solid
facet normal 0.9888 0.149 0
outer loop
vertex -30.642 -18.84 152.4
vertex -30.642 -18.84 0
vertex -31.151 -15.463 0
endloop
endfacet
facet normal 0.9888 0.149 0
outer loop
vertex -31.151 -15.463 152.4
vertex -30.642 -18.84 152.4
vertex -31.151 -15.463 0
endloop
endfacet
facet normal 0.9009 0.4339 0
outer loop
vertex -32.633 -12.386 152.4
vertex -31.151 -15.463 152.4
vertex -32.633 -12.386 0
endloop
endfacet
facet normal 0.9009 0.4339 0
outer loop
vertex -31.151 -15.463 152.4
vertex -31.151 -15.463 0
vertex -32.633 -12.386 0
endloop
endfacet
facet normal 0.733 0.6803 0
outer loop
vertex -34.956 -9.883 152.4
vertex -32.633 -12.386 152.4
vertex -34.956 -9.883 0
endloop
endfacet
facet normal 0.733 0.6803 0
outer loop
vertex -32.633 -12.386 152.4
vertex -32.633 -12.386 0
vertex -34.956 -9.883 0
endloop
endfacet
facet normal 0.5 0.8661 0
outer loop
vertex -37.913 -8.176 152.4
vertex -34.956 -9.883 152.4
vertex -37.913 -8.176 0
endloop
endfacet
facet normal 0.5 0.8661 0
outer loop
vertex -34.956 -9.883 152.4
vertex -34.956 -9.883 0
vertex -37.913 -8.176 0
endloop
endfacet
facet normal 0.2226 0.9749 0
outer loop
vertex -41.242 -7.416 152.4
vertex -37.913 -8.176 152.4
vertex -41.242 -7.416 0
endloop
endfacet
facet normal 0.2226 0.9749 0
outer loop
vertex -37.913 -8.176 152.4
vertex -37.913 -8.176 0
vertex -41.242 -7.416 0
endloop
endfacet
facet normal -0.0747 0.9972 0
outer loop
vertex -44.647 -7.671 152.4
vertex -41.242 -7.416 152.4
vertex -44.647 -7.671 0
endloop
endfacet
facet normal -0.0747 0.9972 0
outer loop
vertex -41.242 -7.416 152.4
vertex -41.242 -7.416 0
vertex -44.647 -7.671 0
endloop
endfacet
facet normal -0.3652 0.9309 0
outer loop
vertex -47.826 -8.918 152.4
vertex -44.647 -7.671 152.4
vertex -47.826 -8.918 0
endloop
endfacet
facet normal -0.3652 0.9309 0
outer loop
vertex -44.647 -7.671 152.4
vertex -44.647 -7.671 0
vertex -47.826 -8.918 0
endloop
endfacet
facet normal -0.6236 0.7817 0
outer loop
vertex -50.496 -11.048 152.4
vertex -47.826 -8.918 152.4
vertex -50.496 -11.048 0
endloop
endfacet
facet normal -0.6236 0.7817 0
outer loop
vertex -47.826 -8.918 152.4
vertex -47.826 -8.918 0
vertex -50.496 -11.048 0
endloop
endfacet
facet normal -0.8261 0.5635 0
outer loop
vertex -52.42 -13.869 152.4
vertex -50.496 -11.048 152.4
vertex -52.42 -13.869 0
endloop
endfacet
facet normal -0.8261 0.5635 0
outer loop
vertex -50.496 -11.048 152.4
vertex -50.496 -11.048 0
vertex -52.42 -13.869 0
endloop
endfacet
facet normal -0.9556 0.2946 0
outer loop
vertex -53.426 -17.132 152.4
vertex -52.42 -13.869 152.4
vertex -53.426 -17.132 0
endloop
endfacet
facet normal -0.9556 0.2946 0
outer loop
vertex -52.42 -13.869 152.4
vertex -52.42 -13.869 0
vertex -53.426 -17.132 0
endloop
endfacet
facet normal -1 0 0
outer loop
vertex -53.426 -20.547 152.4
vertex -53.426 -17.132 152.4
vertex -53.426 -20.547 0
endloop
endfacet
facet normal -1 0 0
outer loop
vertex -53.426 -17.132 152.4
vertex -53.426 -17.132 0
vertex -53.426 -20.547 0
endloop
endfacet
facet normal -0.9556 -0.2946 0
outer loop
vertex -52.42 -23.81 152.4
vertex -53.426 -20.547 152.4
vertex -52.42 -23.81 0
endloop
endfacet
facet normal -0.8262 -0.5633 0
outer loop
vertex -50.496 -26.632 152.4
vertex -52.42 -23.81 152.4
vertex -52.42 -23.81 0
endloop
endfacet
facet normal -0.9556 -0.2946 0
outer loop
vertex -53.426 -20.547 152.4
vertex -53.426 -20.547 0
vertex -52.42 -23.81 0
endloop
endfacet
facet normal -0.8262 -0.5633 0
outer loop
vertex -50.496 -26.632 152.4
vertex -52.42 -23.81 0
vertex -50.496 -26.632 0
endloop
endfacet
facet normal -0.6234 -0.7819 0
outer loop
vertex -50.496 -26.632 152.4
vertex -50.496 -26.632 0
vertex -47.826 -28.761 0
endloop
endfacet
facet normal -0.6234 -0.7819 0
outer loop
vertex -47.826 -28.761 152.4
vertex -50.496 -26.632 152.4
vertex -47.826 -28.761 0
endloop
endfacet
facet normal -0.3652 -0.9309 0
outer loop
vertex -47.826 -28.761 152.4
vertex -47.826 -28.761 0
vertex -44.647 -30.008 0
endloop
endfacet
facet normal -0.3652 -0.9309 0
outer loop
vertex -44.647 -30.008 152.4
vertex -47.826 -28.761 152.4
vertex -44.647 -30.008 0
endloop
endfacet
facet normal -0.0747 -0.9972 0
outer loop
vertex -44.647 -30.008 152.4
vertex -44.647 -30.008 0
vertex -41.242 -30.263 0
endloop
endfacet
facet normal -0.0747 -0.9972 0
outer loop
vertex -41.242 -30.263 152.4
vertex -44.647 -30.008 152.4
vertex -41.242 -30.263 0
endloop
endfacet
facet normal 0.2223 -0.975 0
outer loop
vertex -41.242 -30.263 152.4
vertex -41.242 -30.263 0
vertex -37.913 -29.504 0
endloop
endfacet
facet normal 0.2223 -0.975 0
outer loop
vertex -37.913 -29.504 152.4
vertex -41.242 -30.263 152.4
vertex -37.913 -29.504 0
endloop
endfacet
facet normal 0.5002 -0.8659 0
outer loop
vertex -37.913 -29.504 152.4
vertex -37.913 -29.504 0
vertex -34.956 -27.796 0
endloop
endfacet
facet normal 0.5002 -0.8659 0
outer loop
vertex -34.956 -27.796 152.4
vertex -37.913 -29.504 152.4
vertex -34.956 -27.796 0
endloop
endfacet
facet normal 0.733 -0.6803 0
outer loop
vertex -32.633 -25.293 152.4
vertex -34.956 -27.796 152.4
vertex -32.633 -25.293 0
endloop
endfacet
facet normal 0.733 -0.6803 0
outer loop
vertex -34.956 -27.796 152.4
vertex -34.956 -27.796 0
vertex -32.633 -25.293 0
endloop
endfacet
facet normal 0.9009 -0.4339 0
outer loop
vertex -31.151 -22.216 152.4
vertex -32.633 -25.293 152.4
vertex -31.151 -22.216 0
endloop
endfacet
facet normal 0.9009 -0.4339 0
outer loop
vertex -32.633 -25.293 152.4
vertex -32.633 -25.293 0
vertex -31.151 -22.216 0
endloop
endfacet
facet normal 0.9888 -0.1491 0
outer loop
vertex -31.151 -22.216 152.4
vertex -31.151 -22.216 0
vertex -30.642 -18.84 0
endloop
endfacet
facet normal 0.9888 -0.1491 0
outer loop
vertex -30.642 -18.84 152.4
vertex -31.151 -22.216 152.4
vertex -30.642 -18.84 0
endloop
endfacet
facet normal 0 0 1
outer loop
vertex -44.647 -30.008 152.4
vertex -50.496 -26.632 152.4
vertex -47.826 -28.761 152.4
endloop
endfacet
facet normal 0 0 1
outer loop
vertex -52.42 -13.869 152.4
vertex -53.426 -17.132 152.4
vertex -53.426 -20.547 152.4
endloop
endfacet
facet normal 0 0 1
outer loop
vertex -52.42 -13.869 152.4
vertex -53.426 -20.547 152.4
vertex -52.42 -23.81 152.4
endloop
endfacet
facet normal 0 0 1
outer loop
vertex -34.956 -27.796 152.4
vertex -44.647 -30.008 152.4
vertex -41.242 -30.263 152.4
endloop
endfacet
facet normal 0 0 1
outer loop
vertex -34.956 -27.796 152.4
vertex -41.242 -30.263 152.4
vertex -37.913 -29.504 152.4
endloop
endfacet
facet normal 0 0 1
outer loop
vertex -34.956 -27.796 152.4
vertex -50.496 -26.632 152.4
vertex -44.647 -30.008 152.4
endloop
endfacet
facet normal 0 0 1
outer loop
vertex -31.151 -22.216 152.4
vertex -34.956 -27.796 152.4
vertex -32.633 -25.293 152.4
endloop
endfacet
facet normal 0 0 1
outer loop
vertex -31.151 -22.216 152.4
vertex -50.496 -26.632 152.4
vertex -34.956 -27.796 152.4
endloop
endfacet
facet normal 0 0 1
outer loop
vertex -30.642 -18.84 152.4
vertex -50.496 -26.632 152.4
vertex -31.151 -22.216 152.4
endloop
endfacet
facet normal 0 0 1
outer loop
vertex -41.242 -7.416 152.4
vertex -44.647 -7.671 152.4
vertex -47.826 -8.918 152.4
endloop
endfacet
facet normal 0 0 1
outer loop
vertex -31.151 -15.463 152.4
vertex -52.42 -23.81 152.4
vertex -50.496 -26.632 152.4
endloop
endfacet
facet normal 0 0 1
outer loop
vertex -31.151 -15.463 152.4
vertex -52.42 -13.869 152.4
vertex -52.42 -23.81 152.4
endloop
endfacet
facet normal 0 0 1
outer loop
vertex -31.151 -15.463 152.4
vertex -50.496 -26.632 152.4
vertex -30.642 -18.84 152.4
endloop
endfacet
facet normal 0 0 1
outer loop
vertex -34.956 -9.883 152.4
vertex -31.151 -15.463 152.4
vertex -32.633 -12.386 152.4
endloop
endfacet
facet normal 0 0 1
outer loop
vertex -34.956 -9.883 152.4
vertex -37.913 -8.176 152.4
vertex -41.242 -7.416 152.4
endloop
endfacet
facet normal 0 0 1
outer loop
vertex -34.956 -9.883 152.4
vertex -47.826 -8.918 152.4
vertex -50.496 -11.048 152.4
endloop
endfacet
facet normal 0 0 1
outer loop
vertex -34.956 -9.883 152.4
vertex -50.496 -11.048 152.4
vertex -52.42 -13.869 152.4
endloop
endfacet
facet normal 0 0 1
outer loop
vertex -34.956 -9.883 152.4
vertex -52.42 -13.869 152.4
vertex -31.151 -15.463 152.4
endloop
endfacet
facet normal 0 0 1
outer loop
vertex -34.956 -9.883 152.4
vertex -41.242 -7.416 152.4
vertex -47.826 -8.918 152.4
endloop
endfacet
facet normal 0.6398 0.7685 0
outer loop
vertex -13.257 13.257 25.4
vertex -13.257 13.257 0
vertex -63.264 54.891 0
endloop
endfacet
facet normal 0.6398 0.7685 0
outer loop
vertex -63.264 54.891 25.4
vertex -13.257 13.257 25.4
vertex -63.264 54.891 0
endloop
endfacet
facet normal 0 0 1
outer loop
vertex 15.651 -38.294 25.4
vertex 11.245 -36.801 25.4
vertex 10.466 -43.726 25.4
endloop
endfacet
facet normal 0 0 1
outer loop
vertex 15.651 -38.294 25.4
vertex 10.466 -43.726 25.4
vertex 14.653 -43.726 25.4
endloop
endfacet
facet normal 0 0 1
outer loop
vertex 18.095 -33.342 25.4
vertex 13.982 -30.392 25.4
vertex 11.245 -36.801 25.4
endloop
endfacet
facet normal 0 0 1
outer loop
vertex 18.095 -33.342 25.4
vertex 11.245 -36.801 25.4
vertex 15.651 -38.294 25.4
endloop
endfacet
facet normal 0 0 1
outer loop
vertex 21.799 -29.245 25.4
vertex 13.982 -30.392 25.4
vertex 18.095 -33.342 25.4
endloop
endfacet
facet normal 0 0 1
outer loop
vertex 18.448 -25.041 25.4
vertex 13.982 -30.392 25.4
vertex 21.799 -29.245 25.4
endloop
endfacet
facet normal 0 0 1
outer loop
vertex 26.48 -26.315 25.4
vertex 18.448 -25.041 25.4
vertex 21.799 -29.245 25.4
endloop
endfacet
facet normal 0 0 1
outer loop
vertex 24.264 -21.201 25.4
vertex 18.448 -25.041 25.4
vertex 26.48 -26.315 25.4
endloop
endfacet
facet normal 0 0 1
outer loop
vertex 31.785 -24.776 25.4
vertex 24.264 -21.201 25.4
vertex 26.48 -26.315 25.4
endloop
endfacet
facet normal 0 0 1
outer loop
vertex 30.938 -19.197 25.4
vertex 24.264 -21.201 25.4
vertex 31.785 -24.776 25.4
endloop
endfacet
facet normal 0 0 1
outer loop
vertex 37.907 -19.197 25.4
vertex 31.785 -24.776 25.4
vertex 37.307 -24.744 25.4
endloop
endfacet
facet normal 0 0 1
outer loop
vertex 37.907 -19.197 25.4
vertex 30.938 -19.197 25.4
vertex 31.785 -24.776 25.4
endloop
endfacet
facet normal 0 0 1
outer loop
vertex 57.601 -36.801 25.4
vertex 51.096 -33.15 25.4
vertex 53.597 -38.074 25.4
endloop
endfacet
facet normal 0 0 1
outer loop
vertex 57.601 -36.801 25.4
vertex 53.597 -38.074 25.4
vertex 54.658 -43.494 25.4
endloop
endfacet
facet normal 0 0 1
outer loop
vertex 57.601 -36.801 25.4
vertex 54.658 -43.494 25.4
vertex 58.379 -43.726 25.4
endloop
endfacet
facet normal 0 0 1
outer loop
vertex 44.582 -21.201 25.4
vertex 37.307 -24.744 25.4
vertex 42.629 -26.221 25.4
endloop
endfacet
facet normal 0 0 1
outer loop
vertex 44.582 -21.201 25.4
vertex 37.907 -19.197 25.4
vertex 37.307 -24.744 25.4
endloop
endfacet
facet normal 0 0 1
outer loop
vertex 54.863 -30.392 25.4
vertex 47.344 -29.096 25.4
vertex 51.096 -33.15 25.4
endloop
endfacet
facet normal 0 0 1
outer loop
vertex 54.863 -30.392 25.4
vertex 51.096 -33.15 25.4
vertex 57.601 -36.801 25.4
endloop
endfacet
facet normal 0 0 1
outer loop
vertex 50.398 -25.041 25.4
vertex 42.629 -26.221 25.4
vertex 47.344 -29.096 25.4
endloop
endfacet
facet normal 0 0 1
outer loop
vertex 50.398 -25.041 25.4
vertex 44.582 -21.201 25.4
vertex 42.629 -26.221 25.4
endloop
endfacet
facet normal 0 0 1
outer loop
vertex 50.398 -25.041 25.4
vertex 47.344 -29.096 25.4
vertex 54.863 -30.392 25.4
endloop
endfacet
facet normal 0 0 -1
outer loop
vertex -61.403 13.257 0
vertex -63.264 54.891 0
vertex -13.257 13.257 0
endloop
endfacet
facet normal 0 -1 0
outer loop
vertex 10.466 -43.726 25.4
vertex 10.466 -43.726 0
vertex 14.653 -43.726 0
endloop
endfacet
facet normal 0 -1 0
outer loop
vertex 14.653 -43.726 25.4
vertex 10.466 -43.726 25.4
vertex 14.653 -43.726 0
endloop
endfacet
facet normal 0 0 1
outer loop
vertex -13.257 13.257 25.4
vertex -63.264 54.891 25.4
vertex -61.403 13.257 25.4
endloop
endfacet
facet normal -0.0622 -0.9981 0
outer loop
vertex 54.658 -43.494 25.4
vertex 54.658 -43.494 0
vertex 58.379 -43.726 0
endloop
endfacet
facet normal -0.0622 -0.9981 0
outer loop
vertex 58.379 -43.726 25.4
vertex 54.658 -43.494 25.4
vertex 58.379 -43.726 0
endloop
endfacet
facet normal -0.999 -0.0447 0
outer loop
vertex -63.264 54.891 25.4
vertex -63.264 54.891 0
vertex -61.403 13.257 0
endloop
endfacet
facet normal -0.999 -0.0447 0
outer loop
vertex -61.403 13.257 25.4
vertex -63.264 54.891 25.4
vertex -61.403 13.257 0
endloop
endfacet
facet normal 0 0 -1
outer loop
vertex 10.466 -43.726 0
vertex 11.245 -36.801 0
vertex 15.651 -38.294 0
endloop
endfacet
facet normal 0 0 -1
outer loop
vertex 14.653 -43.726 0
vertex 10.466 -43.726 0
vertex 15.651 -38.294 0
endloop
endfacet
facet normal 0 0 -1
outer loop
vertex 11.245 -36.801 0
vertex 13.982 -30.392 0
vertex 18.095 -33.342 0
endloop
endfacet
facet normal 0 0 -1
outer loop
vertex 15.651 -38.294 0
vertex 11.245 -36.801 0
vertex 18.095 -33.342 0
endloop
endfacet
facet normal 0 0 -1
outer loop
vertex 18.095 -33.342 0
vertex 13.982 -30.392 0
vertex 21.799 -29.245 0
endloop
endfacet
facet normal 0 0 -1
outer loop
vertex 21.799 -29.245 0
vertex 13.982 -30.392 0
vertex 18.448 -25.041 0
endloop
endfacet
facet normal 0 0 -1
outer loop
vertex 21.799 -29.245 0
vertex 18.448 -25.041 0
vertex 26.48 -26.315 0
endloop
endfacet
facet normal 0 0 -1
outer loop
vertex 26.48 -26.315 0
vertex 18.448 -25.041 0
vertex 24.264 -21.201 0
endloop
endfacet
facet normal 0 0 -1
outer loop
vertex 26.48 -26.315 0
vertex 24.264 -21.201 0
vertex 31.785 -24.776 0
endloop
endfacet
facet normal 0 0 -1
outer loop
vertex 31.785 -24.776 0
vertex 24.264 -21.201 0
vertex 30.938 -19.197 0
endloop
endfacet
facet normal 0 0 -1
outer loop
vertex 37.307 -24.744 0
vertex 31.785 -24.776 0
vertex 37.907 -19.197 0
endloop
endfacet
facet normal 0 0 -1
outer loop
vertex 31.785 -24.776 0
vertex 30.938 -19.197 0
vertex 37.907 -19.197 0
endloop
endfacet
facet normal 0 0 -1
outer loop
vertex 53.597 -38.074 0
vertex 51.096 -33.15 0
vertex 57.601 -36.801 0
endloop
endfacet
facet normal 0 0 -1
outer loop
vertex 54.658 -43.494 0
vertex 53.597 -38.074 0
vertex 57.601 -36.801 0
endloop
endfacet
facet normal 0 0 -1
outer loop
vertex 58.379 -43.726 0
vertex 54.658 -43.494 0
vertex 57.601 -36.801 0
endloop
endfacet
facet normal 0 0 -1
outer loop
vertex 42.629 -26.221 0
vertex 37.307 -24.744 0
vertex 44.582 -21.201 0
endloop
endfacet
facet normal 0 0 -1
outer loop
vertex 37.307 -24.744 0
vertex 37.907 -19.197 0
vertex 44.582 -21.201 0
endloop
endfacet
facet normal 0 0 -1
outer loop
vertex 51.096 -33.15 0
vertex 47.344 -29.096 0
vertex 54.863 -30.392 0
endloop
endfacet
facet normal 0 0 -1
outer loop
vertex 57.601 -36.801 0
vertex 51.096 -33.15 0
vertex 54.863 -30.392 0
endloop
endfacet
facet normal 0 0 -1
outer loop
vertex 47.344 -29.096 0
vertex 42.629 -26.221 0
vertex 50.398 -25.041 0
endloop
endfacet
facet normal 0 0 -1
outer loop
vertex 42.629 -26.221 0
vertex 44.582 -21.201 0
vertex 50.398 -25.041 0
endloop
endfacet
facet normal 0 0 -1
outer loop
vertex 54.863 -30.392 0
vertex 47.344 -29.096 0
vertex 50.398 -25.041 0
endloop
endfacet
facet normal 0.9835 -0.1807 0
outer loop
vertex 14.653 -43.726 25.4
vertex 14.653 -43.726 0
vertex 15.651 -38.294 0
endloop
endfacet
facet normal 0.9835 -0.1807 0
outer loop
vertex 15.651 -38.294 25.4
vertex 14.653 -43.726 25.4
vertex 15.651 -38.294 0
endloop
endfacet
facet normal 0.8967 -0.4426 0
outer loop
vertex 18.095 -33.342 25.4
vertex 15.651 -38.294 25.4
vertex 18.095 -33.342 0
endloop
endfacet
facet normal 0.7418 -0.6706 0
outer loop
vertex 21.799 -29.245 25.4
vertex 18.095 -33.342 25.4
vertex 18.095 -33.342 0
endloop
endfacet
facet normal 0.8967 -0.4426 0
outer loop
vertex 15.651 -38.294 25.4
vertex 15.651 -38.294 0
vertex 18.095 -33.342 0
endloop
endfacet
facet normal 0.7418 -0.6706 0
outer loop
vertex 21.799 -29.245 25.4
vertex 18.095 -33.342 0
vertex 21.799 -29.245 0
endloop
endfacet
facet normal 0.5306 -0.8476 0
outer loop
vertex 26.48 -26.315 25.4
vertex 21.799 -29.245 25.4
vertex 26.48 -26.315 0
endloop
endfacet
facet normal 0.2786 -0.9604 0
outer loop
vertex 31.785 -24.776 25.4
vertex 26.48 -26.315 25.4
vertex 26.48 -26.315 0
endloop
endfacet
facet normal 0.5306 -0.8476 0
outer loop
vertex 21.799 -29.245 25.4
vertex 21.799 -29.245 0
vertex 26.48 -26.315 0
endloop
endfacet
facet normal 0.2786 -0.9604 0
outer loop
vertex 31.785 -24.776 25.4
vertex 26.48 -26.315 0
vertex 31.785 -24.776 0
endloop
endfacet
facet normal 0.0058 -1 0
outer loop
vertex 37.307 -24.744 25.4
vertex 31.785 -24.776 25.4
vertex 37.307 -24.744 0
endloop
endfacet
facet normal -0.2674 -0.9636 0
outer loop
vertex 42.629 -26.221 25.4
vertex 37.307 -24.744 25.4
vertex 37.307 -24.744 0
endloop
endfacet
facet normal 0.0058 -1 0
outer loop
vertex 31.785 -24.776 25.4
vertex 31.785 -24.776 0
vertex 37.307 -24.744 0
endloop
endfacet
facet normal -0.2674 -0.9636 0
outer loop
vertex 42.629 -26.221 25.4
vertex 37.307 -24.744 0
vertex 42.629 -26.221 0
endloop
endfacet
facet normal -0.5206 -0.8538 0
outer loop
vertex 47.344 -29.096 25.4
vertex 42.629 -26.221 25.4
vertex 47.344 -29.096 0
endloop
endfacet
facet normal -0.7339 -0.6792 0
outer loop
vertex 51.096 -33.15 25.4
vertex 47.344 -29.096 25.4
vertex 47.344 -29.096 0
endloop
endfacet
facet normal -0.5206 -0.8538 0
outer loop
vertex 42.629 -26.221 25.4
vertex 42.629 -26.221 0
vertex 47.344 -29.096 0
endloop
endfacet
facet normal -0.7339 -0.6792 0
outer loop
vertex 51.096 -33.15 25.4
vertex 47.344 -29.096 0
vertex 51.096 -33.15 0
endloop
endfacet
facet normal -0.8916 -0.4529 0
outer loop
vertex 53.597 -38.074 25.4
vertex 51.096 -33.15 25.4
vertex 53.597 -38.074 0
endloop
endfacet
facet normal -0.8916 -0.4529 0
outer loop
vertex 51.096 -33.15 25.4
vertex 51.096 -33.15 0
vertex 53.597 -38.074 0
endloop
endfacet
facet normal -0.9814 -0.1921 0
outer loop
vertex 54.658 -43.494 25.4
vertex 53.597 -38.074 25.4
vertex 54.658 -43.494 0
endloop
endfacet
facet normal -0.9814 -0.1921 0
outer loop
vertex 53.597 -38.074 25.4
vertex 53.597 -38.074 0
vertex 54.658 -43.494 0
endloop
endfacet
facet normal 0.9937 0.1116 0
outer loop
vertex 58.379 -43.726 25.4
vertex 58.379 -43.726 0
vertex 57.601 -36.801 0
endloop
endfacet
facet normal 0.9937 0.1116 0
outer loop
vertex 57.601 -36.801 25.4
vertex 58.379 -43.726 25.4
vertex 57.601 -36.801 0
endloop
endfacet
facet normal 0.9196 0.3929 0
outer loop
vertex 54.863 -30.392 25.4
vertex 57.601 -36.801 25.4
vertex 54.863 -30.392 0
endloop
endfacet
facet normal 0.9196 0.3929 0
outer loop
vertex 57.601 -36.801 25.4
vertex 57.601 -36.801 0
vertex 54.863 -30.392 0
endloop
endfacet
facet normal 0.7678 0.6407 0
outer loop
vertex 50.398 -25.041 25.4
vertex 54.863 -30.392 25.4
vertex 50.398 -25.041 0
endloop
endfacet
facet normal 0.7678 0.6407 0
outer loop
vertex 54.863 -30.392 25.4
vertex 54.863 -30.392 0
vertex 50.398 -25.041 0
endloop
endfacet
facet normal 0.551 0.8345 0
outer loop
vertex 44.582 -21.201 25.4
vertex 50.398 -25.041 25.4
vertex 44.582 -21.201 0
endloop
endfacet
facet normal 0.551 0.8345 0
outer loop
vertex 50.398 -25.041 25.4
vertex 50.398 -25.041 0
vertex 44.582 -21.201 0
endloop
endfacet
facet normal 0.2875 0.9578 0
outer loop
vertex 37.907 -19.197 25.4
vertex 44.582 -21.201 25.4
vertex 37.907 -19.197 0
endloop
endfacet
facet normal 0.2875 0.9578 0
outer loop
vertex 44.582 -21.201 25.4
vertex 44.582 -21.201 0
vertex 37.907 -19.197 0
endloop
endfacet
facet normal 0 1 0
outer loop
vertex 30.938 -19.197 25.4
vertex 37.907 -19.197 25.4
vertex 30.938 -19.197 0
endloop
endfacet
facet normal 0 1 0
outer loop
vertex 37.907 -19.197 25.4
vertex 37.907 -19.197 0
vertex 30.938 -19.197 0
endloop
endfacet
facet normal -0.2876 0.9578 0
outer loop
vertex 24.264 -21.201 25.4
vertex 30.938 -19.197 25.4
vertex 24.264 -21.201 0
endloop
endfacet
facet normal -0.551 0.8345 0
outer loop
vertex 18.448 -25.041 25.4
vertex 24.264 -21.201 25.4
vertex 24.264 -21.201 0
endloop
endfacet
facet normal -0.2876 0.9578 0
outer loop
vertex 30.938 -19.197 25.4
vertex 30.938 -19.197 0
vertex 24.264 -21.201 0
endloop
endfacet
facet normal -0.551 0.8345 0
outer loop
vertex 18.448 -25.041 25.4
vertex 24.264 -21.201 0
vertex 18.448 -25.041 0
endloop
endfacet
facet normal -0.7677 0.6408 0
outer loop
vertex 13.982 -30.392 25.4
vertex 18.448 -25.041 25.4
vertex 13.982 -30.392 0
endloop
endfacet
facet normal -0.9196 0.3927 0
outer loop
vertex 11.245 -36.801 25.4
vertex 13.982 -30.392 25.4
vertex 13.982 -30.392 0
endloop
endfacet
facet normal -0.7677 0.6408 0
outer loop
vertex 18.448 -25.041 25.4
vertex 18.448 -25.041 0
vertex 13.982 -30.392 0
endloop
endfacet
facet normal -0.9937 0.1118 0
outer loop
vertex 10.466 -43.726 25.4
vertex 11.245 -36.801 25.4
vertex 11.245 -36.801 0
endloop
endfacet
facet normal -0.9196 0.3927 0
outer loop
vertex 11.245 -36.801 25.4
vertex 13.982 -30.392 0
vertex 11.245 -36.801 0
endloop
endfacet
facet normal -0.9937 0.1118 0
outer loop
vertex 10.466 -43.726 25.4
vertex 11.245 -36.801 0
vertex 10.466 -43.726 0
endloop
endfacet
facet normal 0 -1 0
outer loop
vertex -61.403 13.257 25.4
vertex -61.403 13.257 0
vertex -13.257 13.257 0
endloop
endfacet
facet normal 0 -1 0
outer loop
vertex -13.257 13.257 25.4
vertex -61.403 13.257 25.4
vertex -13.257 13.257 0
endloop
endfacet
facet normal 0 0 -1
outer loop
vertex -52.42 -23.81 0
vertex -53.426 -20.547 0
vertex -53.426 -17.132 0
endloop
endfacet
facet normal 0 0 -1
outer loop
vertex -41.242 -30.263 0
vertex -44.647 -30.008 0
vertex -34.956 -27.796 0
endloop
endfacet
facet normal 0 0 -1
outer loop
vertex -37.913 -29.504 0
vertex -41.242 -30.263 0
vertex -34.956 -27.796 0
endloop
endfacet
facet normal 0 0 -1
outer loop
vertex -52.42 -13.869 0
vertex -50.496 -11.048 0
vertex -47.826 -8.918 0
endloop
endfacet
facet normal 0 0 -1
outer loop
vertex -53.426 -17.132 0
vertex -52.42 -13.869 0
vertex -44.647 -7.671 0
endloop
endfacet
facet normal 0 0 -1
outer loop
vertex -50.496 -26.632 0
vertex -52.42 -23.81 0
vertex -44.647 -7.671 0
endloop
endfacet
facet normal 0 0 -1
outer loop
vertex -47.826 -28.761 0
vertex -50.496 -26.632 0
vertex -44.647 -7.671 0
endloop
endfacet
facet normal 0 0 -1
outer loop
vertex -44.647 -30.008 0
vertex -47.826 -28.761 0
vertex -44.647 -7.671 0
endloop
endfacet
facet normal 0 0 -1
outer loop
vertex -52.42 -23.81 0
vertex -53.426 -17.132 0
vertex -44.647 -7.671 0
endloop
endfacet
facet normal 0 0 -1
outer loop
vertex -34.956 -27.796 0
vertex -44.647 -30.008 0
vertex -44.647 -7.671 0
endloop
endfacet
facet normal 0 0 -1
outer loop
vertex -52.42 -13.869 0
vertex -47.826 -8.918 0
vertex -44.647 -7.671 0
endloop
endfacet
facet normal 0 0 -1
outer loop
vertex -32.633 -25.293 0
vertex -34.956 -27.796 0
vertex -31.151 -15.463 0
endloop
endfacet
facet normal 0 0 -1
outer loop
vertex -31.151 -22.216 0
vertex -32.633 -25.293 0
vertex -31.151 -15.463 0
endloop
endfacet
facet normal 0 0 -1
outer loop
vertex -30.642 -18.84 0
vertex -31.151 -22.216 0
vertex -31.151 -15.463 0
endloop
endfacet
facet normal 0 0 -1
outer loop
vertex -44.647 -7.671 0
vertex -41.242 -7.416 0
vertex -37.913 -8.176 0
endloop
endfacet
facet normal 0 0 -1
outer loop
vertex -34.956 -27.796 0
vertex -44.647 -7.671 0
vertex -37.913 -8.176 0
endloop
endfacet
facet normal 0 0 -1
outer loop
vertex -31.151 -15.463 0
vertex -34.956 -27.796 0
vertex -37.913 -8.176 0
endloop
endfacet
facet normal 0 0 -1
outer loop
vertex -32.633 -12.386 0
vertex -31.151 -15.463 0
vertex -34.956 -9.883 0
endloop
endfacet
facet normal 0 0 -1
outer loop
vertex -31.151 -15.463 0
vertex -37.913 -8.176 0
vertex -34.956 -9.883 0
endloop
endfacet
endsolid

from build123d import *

# Parameters (mm, degrees)
F1_DEPTH = 25.4
F2_R     = 11.455953
F3_DEPTH = 152.4
F5_DEPTH = 25.4
F6_R     = 6.85294
F7_DEPTH = 71.374


with BuildPart() as f1:
    # F0 (on Top) → F1 (new body)
    with BuildSketch(Plane.XY):
        Polygon((-13.257471, 13.257472), (-63.263722, 54.890584), (-61.403025, 13.257472), align=None)
    extrude(amount=F1_DEPTH)


with BuildPart() as f3:
    # F2 (on Top) → F3 (new body)
    with BuildSketch(Plane.XY):
        with Locations((-42.098284, -18.839564)):
            Circle(F2_R)
    extrude(amount=F3_DEPTH)

    # F6 (on face) → F7 (join)
    with BuildSketch(Plane.XY.offset(152.4)):
        with Locations((-42.098284, -18.839564)):
            Circle(F6_R)
    extrude(amount=-F7_DEPTH)


with BuildPart() as f5:
    # F4 (on Top) → F5 (new body)
    with BuildSketch(Plane.XY):
        with BuildLine():
            ThreePointArc((14.652994, -43.726396), (34.544791, -24.568492), (54.657999, -43.493811))
            Line((54.657999, -43.493811), (58.379393, -43.726396))
            ThreePointArc((58.379393, -43.726396), (34.422908, -18.94203), (10.466423, -43.726396))
            Line((10.466423, -43.726396), (14.652994, -43.726396))
        make_face()
    extrude(amount=F5_DEPTH)


solid = Compound([f1.part, f3.part, f5.part])
